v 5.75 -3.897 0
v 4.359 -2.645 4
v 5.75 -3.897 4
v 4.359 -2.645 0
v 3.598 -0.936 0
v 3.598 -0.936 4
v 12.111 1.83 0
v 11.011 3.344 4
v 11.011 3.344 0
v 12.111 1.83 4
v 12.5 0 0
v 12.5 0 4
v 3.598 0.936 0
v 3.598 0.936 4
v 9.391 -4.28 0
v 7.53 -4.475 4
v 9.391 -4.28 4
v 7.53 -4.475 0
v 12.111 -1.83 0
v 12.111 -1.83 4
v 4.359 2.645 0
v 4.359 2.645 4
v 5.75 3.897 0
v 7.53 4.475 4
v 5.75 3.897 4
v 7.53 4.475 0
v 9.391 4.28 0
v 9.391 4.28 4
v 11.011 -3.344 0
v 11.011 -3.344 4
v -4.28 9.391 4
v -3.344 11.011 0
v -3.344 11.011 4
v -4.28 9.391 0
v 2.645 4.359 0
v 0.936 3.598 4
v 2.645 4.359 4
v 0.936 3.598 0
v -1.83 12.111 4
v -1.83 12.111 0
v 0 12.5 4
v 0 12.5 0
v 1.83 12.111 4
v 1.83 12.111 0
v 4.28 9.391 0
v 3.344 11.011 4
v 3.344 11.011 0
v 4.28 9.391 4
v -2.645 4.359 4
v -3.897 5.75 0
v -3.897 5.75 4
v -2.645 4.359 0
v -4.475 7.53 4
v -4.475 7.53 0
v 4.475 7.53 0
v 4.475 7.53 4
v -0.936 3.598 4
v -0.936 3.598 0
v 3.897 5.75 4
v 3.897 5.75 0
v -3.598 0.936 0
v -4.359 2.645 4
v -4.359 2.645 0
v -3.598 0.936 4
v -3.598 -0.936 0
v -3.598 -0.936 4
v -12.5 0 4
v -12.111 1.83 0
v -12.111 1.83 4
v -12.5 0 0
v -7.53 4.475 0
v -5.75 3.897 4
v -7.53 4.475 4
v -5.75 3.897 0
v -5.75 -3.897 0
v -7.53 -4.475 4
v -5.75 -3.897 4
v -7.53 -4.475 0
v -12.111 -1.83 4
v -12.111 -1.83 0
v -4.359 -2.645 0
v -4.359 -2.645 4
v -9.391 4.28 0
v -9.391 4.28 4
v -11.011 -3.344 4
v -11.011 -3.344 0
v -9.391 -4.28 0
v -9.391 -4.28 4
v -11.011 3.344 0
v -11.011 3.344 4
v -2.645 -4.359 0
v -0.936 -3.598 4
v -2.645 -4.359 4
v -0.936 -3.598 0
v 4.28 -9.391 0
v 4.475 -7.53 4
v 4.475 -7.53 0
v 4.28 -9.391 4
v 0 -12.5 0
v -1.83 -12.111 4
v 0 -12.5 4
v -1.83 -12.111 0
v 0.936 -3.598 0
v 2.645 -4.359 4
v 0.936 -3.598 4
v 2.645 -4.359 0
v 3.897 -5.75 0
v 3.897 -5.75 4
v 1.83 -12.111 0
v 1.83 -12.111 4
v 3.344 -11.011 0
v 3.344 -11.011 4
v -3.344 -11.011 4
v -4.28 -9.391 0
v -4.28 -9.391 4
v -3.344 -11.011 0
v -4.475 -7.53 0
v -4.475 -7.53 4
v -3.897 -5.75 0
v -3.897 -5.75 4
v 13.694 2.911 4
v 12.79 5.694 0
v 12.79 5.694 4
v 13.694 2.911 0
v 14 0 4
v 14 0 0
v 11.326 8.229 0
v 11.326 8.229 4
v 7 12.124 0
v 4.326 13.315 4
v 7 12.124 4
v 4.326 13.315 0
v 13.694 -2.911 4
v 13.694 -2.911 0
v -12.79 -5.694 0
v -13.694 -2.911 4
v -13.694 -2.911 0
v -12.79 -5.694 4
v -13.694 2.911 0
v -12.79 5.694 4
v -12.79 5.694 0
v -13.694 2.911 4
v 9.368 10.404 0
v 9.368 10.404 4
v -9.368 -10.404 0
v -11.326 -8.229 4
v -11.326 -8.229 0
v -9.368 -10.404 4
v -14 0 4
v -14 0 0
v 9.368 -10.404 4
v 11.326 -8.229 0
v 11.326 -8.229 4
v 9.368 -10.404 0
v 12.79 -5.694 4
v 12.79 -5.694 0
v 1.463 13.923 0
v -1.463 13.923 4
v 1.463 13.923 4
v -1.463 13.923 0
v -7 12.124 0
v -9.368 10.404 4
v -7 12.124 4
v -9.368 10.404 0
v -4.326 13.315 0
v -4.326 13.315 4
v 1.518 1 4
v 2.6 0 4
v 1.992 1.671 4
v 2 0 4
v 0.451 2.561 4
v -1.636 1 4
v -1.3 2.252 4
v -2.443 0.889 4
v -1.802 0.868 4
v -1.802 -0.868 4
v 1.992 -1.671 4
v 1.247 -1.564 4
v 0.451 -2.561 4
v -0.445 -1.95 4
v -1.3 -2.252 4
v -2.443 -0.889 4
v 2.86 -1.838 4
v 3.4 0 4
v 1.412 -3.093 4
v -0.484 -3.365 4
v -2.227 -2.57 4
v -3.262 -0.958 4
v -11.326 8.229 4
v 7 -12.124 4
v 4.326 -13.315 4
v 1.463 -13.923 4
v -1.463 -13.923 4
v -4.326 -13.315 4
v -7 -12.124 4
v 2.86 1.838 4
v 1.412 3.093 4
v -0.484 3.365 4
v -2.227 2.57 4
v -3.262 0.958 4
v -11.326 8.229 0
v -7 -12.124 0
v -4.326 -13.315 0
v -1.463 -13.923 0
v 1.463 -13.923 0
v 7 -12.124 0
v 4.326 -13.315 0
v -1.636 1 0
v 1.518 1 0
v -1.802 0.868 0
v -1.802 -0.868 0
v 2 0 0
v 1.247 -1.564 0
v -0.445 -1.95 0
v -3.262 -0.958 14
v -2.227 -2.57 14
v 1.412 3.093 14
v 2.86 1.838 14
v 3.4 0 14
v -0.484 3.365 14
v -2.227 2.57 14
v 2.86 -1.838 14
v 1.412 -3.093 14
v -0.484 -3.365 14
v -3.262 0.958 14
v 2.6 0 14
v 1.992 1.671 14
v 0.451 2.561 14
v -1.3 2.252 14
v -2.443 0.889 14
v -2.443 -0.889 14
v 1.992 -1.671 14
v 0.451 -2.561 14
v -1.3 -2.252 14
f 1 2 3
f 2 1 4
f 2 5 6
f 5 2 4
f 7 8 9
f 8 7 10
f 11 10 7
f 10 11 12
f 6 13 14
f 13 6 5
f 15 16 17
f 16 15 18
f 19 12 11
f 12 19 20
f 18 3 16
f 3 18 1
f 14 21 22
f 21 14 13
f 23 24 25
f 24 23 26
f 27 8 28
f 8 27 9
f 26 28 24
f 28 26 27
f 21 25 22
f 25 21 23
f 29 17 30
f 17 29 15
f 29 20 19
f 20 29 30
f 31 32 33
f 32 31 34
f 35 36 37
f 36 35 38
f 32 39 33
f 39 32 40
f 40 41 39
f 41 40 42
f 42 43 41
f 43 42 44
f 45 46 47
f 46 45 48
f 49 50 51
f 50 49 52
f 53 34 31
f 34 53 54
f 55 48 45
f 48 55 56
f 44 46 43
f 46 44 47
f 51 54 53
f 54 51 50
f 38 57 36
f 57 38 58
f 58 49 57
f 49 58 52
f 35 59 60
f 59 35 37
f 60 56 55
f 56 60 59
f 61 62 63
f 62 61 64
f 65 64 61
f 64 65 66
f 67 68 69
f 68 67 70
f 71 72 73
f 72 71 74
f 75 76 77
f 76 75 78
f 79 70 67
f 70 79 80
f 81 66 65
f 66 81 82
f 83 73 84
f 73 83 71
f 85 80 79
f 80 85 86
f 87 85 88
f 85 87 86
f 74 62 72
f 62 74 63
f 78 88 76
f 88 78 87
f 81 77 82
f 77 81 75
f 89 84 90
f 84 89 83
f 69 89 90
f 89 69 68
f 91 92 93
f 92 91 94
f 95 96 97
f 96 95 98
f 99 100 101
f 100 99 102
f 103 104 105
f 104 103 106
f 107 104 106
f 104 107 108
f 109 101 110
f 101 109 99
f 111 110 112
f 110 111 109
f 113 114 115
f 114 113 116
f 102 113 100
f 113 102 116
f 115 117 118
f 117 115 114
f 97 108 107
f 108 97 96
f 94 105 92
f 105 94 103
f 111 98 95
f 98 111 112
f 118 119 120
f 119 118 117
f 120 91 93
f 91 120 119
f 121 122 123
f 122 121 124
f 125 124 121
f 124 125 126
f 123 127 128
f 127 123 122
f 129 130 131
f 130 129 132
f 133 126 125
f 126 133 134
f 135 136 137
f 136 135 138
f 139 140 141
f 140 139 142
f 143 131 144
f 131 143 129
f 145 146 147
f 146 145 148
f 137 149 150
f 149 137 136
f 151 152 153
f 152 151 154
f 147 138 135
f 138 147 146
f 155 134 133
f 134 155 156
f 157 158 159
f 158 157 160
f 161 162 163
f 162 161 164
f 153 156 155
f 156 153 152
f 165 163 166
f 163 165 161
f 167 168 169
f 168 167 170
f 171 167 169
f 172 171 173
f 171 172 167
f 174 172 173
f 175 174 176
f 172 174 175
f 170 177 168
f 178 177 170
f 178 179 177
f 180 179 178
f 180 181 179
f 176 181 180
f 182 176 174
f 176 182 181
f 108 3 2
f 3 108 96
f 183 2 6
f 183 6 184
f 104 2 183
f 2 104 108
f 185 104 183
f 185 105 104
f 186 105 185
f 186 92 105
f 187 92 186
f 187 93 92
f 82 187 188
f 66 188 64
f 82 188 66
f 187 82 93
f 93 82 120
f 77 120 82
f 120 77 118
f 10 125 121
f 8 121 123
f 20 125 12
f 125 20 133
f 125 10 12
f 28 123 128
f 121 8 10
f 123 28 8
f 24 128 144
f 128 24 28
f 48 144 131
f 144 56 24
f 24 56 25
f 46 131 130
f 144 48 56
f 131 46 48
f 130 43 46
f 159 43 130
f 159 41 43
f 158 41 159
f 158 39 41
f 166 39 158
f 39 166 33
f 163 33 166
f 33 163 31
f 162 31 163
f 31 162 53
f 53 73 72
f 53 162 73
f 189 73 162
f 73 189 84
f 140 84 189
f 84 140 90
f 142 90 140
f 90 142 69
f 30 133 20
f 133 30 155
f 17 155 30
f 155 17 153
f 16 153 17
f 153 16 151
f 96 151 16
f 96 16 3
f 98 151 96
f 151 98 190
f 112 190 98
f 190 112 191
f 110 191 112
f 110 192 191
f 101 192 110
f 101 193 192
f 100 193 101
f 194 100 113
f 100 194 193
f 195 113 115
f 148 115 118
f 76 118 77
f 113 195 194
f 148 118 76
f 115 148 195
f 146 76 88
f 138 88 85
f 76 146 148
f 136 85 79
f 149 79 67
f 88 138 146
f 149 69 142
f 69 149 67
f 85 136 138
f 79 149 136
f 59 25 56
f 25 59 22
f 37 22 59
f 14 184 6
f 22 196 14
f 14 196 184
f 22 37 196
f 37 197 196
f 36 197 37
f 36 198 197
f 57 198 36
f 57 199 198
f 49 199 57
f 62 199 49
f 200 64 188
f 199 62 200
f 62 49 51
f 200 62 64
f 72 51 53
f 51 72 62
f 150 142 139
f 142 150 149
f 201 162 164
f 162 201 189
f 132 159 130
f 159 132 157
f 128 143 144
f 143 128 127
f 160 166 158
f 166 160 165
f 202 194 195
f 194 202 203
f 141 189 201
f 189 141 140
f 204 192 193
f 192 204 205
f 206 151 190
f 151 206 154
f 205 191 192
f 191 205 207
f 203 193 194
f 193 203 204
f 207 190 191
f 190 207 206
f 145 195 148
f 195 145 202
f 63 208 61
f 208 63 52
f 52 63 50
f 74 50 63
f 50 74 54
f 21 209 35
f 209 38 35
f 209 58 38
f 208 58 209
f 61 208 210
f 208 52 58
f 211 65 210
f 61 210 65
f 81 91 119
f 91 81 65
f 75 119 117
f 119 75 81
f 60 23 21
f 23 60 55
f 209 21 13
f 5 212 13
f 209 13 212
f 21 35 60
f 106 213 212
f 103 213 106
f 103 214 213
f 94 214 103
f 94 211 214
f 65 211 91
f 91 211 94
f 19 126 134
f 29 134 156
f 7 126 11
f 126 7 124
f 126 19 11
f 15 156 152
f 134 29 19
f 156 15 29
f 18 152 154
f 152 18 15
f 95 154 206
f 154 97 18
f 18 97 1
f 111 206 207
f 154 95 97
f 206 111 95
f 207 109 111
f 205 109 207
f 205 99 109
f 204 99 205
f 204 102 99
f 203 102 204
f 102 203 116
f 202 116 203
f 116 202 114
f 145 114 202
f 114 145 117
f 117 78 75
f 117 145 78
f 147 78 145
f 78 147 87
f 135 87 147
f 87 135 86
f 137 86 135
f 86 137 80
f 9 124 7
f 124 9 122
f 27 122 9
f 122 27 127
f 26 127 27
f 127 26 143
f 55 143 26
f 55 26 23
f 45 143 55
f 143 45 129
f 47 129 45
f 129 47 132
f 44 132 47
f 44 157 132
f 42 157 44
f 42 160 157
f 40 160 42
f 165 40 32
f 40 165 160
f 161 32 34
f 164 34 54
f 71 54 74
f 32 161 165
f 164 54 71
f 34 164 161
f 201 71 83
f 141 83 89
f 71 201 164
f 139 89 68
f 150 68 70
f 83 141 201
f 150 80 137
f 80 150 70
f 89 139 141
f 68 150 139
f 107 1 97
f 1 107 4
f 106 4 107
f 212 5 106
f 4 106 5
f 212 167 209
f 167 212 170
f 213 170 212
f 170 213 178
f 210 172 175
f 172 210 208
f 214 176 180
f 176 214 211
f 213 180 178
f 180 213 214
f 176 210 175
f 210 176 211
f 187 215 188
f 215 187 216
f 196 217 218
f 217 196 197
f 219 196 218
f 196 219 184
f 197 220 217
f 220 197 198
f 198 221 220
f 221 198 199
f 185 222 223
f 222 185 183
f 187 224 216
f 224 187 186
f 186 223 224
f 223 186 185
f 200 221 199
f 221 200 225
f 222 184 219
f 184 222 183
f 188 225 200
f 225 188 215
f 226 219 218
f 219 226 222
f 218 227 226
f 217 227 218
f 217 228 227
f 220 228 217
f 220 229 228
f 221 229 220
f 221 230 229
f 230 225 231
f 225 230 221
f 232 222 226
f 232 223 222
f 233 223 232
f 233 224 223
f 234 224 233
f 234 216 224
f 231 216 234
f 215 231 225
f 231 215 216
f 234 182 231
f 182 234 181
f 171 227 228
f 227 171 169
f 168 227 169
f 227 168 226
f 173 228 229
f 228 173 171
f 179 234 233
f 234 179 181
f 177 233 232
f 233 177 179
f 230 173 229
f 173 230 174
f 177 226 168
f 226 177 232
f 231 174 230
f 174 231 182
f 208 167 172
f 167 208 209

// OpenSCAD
// file: ../lib/wheel.scad
module wheel(big_holes=true) {
    difference() {
        cylinder(h=4, r=14);
        if (big_holes) {
            for (i=[0:1:4]) {
                rotate([0,0,90*i])
                translate([8,0,-0.01])
                cylinder(h=4.02, r=4.5);
            }
        } else {
            for (i=[0:1:9]) {
                rotate([0,0,45*i])
                translate([10.7,0,-0.01])
                cylinder(h=4.02, r=2);
            }
        }
    }
}
// main file
include <../lib/wheel.scad>

module driveWheel() {
    difference() {
        wheel();
        
        translate([0,0,-0.01])
        cylinder(h=4.02, r=2);
    }
    
    translate([-2.5,1,0])
    cube([5,2,4]);
    
    difference() {
        translate([0,0,4])
        cylinder(h=10, r=3.4);
        
        translate([0,0,3.99])
        cylinder(h=10.02, r=2.6);
    }
}

driveWheel();
